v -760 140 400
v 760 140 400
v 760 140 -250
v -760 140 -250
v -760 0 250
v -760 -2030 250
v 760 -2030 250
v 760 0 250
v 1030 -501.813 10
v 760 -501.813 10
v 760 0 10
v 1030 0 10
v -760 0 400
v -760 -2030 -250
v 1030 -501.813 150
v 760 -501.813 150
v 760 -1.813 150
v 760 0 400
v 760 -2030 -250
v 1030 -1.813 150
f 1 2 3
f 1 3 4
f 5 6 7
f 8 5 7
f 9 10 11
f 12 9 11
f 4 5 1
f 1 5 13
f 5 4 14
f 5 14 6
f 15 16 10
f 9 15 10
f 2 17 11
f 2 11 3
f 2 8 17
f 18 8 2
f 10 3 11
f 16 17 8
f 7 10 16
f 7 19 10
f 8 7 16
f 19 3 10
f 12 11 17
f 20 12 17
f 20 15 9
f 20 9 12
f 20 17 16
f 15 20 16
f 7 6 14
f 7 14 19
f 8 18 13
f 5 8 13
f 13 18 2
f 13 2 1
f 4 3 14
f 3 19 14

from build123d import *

# Parameters (mm, degrees)
F0_W     = 1520
F0_H     = 500
F1_DEPTH = 2030
F2_W     = 1520
F2_H     = 650
F3_DEPTH = 140
F5_DEPTH = 270


with BuildPart() as f1:
    # F0 (on Front) → F1 (new body)
    with BuildSketch(Plane.XZ):
        Rectangle(F0_W, F0_H)
    extrude(amount=F1_DEPTH)



with BuildPart() as f3:
    # F2 (on face) → F3 (new body)
    with BuildSketch(Plane(origin=(0, 0, 0), x_dir=(-1, 0, 0), z_dir=(0, 1, 0))):
        with Locations((0, 75)):
            Rectangle(F2_W, F2_H)
    extrude(amount=F3_DEPTH)


with BuildPart() as f1_1:
    add(f1.part)

    add(f3.part)  # F5 merges F3
    # F4 (on face) → F5 (join)
    with BuildSketch(Plane.YZ.offset(760)):
        Polygon((0, 10), (-1.812994, 150), (-501.812994, 150), (-501.812994, 10), align=None)
    extrude(amount=F5_DEPTH)


solid = f1_1.part
